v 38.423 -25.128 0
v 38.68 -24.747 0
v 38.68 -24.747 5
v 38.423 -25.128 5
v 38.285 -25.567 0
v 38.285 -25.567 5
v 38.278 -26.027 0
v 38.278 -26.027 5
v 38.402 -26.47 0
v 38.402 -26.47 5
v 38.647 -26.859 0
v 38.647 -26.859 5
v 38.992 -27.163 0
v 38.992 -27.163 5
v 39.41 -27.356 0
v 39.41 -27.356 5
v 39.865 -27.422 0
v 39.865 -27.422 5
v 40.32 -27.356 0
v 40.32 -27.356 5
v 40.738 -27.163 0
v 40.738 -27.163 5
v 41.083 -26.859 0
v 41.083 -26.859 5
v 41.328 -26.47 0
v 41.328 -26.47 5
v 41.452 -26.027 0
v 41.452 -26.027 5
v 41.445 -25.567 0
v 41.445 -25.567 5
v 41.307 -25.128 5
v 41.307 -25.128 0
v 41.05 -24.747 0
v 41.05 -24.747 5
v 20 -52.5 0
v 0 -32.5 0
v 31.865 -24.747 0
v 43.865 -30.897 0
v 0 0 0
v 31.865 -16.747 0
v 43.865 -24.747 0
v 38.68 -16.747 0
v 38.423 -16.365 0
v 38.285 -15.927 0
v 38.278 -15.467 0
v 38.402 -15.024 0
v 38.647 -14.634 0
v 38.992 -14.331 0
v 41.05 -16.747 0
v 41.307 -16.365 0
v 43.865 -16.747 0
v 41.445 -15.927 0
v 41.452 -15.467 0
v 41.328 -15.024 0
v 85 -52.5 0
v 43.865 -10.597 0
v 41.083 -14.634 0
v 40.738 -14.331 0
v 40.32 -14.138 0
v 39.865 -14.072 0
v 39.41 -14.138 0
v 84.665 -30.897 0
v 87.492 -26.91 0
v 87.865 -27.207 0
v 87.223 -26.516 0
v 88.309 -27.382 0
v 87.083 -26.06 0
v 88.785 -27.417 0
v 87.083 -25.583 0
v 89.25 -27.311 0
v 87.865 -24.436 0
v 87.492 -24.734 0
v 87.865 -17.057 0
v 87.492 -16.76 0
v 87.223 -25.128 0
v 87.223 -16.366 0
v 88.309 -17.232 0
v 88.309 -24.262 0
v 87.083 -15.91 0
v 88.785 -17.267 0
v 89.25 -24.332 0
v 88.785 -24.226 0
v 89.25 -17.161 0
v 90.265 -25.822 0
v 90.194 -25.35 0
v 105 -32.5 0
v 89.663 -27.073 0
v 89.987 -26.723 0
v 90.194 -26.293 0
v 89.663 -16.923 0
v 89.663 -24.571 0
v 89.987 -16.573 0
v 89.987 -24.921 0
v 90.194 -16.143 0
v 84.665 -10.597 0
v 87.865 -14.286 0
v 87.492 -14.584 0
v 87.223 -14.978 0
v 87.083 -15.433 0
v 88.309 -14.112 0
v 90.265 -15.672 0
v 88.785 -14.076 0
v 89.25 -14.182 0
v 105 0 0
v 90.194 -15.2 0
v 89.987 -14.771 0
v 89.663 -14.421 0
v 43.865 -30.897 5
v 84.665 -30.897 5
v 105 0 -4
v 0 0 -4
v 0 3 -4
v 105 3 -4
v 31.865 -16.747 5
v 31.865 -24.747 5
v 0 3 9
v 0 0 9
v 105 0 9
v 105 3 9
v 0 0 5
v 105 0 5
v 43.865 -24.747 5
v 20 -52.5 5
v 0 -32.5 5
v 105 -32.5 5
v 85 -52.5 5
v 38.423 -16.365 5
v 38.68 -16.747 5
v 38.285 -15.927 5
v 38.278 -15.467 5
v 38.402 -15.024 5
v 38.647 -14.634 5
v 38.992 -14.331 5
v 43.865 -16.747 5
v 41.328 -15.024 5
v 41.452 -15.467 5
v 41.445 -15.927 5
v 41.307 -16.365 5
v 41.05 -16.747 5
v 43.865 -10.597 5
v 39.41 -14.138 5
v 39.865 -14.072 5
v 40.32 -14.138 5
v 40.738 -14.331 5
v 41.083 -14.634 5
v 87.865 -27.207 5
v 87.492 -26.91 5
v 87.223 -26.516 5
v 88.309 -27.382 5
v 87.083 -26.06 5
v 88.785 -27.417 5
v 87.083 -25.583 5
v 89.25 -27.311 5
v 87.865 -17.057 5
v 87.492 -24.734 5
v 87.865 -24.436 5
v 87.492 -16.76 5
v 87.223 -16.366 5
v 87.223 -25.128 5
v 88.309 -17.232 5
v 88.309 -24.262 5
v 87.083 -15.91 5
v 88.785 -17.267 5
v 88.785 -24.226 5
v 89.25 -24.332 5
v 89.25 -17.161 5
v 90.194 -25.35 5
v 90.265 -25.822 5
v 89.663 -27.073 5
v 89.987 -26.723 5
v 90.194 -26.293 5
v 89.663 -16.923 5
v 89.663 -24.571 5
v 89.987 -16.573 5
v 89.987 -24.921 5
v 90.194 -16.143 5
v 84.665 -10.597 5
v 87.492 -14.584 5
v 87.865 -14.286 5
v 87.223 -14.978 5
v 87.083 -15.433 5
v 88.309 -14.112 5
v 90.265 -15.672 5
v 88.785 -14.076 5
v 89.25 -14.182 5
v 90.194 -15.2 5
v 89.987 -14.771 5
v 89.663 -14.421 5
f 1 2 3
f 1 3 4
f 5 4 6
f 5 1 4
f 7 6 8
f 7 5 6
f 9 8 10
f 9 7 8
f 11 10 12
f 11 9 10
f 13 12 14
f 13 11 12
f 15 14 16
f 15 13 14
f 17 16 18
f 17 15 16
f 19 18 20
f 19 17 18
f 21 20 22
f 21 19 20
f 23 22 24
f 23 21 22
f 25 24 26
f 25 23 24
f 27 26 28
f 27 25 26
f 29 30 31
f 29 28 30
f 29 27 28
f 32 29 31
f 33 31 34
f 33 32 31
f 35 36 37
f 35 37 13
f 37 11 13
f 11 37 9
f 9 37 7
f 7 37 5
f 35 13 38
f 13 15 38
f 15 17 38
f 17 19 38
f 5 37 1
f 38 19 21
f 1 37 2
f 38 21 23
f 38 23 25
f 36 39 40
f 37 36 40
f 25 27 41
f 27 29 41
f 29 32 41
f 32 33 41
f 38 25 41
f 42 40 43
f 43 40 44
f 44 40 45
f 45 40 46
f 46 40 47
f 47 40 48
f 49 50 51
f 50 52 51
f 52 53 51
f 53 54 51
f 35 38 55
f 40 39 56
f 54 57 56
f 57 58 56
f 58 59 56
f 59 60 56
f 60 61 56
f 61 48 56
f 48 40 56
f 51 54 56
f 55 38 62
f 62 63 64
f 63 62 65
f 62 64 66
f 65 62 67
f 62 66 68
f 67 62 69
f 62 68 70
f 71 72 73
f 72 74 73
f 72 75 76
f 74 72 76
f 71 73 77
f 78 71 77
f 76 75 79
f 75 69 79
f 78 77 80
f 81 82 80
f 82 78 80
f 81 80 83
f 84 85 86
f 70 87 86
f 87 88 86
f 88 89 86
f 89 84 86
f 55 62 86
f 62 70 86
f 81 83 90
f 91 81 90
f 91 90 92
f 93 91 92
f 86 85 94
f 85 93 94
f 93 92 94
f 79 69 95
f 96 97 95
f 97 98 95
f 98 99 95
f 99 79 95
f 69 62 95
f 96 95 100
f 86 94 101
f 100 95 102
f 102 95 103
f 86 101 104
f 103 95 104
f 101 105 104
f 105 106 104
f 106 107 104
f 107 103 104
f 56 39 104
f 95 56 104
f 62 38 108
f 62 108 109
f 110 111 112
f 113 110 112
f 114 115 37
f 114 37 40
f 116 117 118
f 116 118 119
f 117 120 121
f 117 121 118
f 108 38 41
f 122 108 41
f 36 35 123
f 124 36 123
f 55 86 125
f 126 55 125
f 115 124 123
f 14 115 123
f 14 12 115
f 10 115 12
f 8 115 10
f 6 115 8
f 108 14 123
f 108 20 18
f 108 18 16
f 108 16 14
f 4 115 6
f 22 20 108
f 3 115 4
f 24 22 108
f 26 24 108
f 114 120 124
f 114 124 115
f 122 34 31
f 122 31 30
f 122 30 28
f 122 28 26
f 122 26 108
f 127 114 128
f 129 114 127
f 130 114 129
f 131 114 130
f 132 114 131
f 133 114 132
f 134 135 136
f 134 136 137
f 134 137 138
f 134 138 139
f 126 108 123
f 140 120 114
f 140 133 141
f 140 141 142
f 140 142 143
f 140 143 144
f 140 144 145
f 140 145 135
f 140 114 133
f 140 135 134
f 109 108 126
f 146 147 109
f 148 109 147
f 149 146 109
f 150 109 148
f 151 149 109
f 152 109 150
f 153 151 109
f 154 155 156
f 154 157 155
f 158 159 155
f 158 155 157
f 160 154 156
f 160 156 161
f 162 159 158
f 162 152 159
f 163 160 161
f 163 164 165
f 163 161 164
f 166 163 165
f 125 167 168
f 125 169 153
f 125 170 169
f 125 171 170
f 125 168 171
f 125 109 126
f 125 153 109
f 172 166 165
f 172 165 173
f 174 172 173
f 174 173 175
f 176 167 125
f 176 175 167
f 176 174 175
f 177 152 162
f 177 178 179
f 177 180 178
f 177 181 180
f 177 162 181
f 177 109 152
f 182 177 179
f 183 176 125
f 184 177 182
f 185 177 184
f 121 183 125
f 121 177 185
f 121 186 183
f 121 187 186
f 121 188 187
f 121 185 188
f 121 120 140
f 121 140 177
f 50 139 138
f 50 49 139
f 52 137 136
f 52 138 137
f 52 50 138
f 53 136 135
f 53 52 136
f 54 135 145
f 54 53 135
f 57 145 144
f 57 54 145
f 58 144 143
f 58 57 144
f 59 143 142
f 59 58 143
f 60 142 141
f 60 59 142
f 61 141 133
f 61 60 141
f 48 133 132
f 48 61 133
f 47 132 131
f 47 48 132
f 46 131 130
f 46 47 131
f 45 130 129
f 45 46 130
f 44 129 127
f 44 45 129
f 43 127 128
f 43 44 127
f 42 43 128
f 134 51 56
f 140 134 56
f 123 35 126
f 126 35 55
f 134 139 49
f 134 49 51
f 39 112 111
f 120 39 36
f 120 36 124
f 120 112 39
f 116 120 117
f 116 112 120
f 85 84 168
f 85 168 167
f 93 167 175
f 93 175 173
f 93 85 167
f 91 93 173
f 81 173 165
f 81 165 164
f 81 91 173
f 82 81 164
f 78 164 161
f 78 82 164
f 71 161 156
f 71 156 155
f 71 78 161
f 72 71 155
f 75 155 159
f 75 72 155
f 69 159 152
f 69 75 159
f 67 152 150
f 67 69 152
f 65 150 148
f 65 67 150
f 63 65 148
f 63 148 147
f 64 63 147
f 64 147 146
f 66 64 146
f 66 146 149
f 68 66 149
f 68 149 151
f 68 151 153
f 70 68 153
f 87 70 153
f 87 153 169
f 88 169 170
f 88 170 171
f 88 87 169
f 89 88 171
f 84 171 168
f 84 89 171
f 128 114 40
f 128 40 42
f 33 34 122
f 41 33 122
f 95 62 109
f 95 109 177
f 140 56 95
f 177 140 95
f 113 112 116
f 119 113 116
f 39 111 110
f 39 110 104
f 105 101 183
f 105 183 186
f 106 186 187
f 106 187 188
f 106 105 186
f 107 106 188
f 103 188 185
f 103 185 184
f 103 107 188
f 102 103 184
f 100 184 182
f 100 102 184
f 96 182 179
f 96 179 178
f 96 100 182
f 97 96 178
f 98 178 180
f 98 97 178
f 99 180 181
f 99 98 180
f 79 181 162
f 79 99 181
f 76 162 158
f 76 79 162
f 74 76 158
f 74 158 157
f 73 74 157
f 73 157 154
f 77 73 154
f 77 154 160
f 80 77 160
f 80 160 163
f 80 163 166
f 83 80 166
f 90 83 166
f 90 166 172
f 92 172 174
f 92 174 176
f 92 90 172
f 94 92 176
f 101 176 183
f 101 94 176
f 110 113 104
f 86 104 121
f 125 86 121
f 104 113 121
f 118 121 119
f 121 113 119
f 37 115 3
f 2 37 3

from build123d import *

# Parameters (mm, degrees)
SKETCH_1_W          = 105
SKETCH_1_H          = 52.5
SKETCH_1_R          = 1.6
SKETCH_1_W_2        = 40.8
SKETCH_1_H_2        = 20.3
EXTRUDE_1_DEPTH     = 5
SKETCH_3_W          = 13
SKETCH_3_H          = 3
EXTRUDE_2_DEPTH     = 105
SKETCH_4_W          = 24
SKETCH_4_H          = 8
CUT_EXTRUDE_1_DEPTH = 118.738056719
CHAMFER_1_SIZE      = 20


with BuildPart() as part:
    # 草图1 → 凸台-拉伸1 (new body)
    with BuildSketch(Plane.XY):
        with Locations((52.5, -26.25)):
            Rectangle(SKETCH_1_W, SKETCH_1_H)
        with Locations((39.864981543, -15.671828005)):
            Circle(SKETCH_1_R, mode=Mode.SUBTRACT)
        with Locations((39.864981543, -25.821828005)):
            Circle(SKETCH_1_R, mode=Mode.SUBTRACT)
        with Locations((88.664981543, -15.671828005)):
            Circle(SKETCH_1_R, mode=Mode.SUBTRACT)
        with Locations((88.664981543, -25.821828005)):
            Circle(SKETCH_1_R, mode=Mode.SUBTRACT)
        with Locations((64.264981543, -20.746828005)):
            Rectangle(SKETCH_1_W_2, SKETCH_1_H_2, mode=Mode.SUBTRACT)
    extrude(amount=EXTRUDE_1_DEPTH)

    # 草图3 → 凸台-拉伸2 (add, through all)
    with BuildSketch(Plane.ZY):
        with Locations((2.5, 1.5)):
            Rectangle(SKETCH_3_W, SKETCH_3_H)
    extrude(amount=-EXTRUDE_2_DEPTH)

    # 草图4 → 切除-拉伸1 (cut, through all)
    with BuildSketch(Plane.XY.offset(5)):
        with Locations((43.864981543, -20.746828005)):
            Rectangle(SKETCH_4_W, SKETCH_4_H)
    extrude(amount=-CUT_EXTRUDE_1_DEPTH, mode=Mode.SUBTRACT)

    # 倒角1
    chamfer_1_edges = [part.edges().sort_by_distance(p)[0] for p in [
        (105, -52.5, 2.5),
        (0, -52.5, 2.5),
    ]]
    chamfer(chamfer_1_edges, length=CHAMFER_1_SIZE)


solid = part.part
